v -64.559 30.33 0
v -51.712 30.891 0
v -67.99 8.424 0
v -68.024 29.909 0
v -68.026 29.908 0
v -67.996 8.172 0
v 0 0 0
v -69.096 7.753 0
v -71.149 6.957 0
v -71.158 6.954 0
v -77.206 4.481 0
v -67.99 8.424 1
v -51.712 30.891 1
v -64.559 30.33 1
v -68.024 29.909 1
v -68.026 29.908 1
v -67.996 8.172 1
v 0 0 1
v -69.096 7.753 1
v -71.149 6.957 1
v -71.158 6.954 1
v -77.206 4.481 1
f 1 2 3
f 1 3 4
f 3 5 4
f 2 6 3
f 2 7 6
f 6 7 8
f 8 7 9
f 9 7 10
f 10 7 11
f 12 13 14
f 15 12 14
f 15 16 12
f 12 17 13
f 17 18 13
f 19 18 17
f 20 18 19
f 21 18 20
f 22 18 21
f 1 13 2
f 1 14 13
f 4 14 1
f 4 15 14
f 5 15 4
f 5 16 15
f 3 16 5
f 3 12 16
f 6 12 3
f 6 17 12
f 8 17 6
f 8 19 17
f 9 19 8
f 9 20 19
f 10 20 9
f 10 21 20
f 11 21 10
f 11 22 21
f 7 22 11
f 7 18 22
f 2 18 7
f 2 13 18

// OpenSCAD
// Generated by SolidPython 1.1.3 on 2024-05-19 23:35:49


linear_extrude(height = 1) {
	polygon(points = [[0, 0], [-51.7123125000, 30.8905437500], [-51.8104468750, 30.8862640625], [-51.9085812500, 30.8819843750], [-52.0067156250, 30.8777046875], [-52.1048500000, 30.8734250000], [-52.2029843750, 30.8691453125], [-52.3011187500, 30.8648656250], [-52.3992531250, 30.8605859375], [-52.4973875000, 30.8563062500], [-52.5955218750, 30.8520265625], [-52.6936562500, 30.8477468750], [-52.7917906250, 30.8434671875], [-52.8899250000, 30.8391875000], [-52.9880593750, 30.8349078125], [-53.0861937500, 30.8306281250], [-53.1843281250, 30.8263484375], [-53.2824625000, 30.8220687500], [-53.3805968750, 30.8177890625], [-53.4787312500, 30.8135093750], [-53.5768656250, 30.8092296875], [-53.6750000000, 30.8049500000], [-53.7731343750, 30.8006703125], [-53.8712687500, 30.7963906250], [-53.9694031250, 30.7921109375], [-54.0675375000, 30.7878312500], [-54.1656718750, 30.7835515625], [-54.2638062500, 30.7792718750], [-54.3619406250, 30.7749921875], [-54.4600750000, 30.7707125000], [-54.5582093750, 30.7664328125], [-54.6563437500, 30.7621531250], [-54.7544781250, 30.7578734375], [-54.8526125000, 30.7535937500], [-54.9507468750, 30.7493140625], [-55.0488812500, 30.7450343750], [-55.1470156250, 30.7407546875], [-55.2451500000, 30.7364750000], [-55.3432843750, 30.7321953125], [-55.4414187500, 30.7279156250], [-55.5395531250, 30.7236359375], [-55.6376875000, 30.7193562500], [-55.7358218750, 30.7150765625], [-55.8339562500, 30.7107968750], [-55.9320906250, 30.7065171875], [-56.0302250000, 30.7022375000], [-56.1283593750, 30.6979578125], [-56.2264937500, 30.6936781250], [-56.3246281250, 30.6893984375], [-56.4227625000, 30.6851187500], [-56.5208968750, 30.6808390625], [-56.6190312500, 30.6765593750], [-56.7171656250, 30.6722796875], [-56.8153000000, 30.6680000000], [-56.8757945312, 30.6653617187], [-56.9362890625, 30.6627234375], [-56.9967835937, 30.6600851562], [-57.0572781250, 30.6574468750], [-57.1177726562, 30.6548085937], [-57.1782671875, 30.6521703125], [-57.2387617187, 30.6495320312], [-57.2992562500, 30.6468937500], [-57.3597507812, 30.6442554688], [-57.4202453125, 30.6416171875], [-57.4807398438, 30.6389789063], [-57.5412343750, 30.6363406250], [-57.6017289063, 30.6337023438], [-57.6622234375, 30.6310640625], [-57.7227179688, 30.6284257813], [-57.7832125000, 30.6257875000], [-57.8437070313, 30.6231492188], [-57.9042015625, 30.6205109375], [-57.9646960938, 30.6178726563], [-58.0251906250, 30.6152343750], [-58.0856851563, 30.6125960937], [-58.1461796875, 30.6099578125], [-58.2066742188, 30.6073195312], [-58.2671687500, 30.6046812500], [-58.3276632812, 30.6020429687], [-58.3881578125, 30.5994046875], [-58.4486523437, 30.5967664062], [-58.5091468750, 30.5941281250], [-58.5696414062, 30.5914898437], [-58.6301359375, 30.5888515625], [-58.6906304688, 30.5862132812], [-58.7511250000, 30.5835750000], [-58.8116195313, 30.5809367188], [-58.8721140625, 30.5782984375], [-58.9326085938, 30.5756601563], [-58.9931031250, 30.5730218750], [-59.0535976563, 30.5703835938], [-59.1140921875, 30.5677453125], [-59.1745867188, 30.5651070313], [-59.2350812500, 30.5624687500], [-59.2955757812, 30.5598304688], [-59.3560703125, 30.5571921875], [-59.4165648437, 30.5545539062], [-59.4770593750, 30.5519156250], [-59.5375539062, 30.5492773437], [-59.5980484375, 30.5466390625], [-59.6585429687, 30.5440007812], [-59.7190375000, 30.5413625000], [-59.7795320312, 30.5387242187], [-59.8400265625, 30.5360859375], [-59.9005210938, 30.5334476562], [-59.9610156250, 30.5308093750], [-60.0215101563, 30.5281710937], [-60.0820046875, 30.5255328125], [-60.1424992188, 30.5228945312], [-60.2029937500, 30.5202562500], [-60.2634882812, 30.5176179688], [-60.3239828125, 30.5149796875], [-60.3844773437, 30.5123414063], [-60.4449718750, 30.5097031250], [-60.5054664062, 30.5070648438], [-60.5659609375, 30.5044265625], [-60.6264554687, 30.5017882813], [-60.6869500000, 30.4991500000], [-60.7474445312, 30.4965117187], [-60.8079390625, 30.4938734375], [-60.8684335937, 30.4912351562], [-60.9289281250, 30.4885968750], [-60.9894226562, 30.4859585937], [-61.0499171875, 30.4833203125], [-61.1104117188, 30.4806820312], [-61.1709062500, 30.4780437500], [-61.2314007812, 30.4754054688], [-61.2918953125, 30.4727671875], [-61.3523898437, 30.4701289063], [-61.4128843750, 30.4674906250], [-61.4733789062, 30.4648523438], [-61.5338734375, 30.4622140625], [-61.5943679687, 30.4595757813], [-61.6548625000, 30.4569375000], [-61.7153570312, 30.4542992188], [-61.7758515625, 30.4516609375], [-61.8363460937, 30.4490226563], [-61.8968406250, 30.4463843750], [-61.9573351562, 30.4437460938], [-62.0178296875, 30.4411078125], [-62.0783242187, 30.4384695312], [-62.1388187500, 30.4358312500], [-62.1993132812, 30.4331929687], [-62.2598078125, 30.4305546875], [-62.3203023438, 30.4279164062], [-62.3807968750, 30.4252781250], [-62.4412914063, 30.4226398437], [-62.5017859375, 30.4200015625], [-62.5622804688, 30.4173632812], [-62.6227750000, 30.4147250000], [-62.6832695312, 30.4120867188], [-62.7437640625, 30.4094484375], [-62.8042585937, 30.4068101563], [-62.8647531250, 30.4041718750], [-62.9252476562, 30.4015335938], [-62.9857421875, 30.3988953125], [-63.0462367187, 30.3962570313], [-63.1067312500, 30.3936187500], [-63.1672257812, 30.3909804688], [-63.2277203125, 30.3883421875], [-63.2882148437, 30.3857039063], [-63.3487093750, 30.3830656250], [-63.4092039062, 30.3804273438], [-63.4696984375, 30.3777890625], [-63.5301929688, 30.3751507812], [-63.5906875000, 30.3725125000], [-63.6511820313, 30.3698742187], [-63.7116765625, 30.3672359375], [-63.7721710938, 30.3645976562], [-63.8326656250, 30.3619593750], [-63.8931601563, 30.3593210937], [-63.9536546875, 30.3566828125], [-64.0141492188, 30.3540445312], [-64.0746437500, 30.3514062500], [-64.1351382813, 30.3487679688], [-64.1956328125, 30.3461296875], [-64.2561273438, 30.3434914063], [-64.3166218750, 30.3408531250], [-64.3771164063, 30.3382148438], [-64.4376109375, 30.3355765625], [-64.4981054687, 30.3329382813], [-64.5586000000, 30.3303000000], [-64.6151375000, 30.3234250000], [-64.6716750000, 30.3165500000], [-64.7282125000, 30.3096750000], [-64.7847500000, 30.3028000000], [-64.8412875000, 30.2959250000], [-64.8978250000, 30.2890500000], [-64.9543625000, 30.2821750000], [-65.0109000000, 30.2753000000], [-65.1050468750, 30.2638468750], [-65.1991937500, 30.2523937500], [-65.2933406250, 30.2409406250], [-65.3874875000, 30.2294875000], [-65.4816343750, 30.2180343750], [-65.5757812500, 30.2065812500], [-65.6699281250, 30.1951281250], [-65.7640750000, 30.1836750000], [-65.8582218750, 30.1722218750], [-65.9523687500, 30.1607687500], [-66.0465156250, 30.1493156250], [-66.1406625000, 30.1378625000], [-66.2348093750, 30.1264093750], [-66.3289562500, 30.1149562500], [-66.4231031250, 30.1035031250], [-66.5172500000, 30.0920500000], [-66.6113968750, 30.0805968750], [-66.7055437500, 30.0691437500], [-66.7996906250, 30.0576906250], [-66.8938375000, 30.0462375000], [-66.9879843750, 30.0347843750], [-67.0821312500, 30.0233312500], [-67.1762781250, 30.0118781250], [-67.2704250000, 30.0004250000], [-67.3645718750, 29.9889718750], [-67.4587187500, 29.9775187500], [-67.5528656250, 29.9660656250], [-67.6470125000, 29.9546125000], [-67.7411593750, 29.9431593750], [-67.8353062500, 29.9317062500], [-67.9294531250, 29.9202531250], [-68.0236000000, 29.9088000000], [-68.0256000000, 29.9085000000], [-68.0259000000, 29.9085000000], [-68.0257613281, 29.8245743359], [-68.0256226562, 29.7406486719], [-68.0254839844, 29.6567230078], [-68.0253453125, 29.5727973437], [-68.0252066406, 29.4888716797], [-68.0250679687, 29.4049460156], [-68.0249292969, 29.3210203516], [-68.0247906250, 29.2370946875], [-68.0246519531, 29.1531690234], [-68.0245132812, 29.0692433594], [-68.0243746094, 28.9853176953], [-68.0242359375, 28.9013920312], [-68.0240972656, 28.8174663672], [-68.0239585937, 28.7335407031], [-68.0238199219, 28.6496150391], [-68.0236812500, 28.5656893750], [-68.0235425781, 28.4817637109], [-68.0234039062, 28.3978380469], [-68.0232652344, 28.3139123828], [-68.0231265625, 28.2299867187], [-68.0229878906, 28.1460610547], [-68.0228492187, 28.0621353906], [-68.0227105469, 27.9782097266], [-68.0225718750, 27.8942840625], [-68.0224332031, 27.8103583984], [-68.0222945312, 27.7264327344], [-68.0221558594, 27.6425070703], [-68.0220171875, 27.5585814062], [-68.0218785156, 27.4746557422], [-68.0217398437, 27.3907300781], [-68.0216011719, 27.3068044141], [-68.0214625000, 27.2228787500], [-68.0213238281, 27.1389530859], [-68.0211851562, 27.0550274219], [-68.0210464844, 26.9711017578], [-68.0209078125, 26.8871760937], [-68.0207691406, 26.8032504297], [-68.0206304687, 26.7193247656], [-68.0204917969, 26.6353991016], [-68.0203531250, 26.5514734375], [-68.0202144531, 26.4675477734], [-68.0200757812, 26.3836221094], [-68.0199371094, 26.2996964453], [-68.0197984375, 26.2157707813], [-68.0196597656, 26.1318451172], [-68.0195210937, 26.0479194531], [-68.0193824219, 25.9639937891], [-68.0192437500, 25.8800681250], [-68.0191050781, 25.7961424609], [-68.0189664062, 25.7122167969], [-68.0188277344, 25.6282911328], [-68.0186890625, 25.5443654688], [-68.0185503906, 25.4604398047], [-68.0184117187, 25.3765141406], [-68.0182730469, 25.2925884766], [-68.0181343750, 25.2086628125], [-68.0179957031, 25.1247371484], [-68.0178570312, 25.0408114844], [-68.0177183594, 24.9568858203], [-68.0175796875, 24.8729601563], [-68.0174410156, 24.7890344922], [-68.0173023437, 24.7051088281], [-68.0171636719, 24.6211831641], [-68.0170250000, 24.5372575000], [-68.0168863281, 24.4533318359], [-68.0167476562, 24.3694061719], [-68.0166089844, 24.2854805078], [-68.0164703125, 24.2015548438], [-68.0163316406, 24.1176291797], [-68.0161929687, 24.0337035156], [-68.0160542969, 23.9497778516], [-68.0159156250, 23.8658521875], [-68.0157769531, 23.7819265234], [-68.0156382812, 23.6980008594], [-68.0154996094, 23.6140751953], [-68.0153609375, 23.5301495313], [-68.0152222656, 23.4462238672], [-68.0150835937, 23.3622982031], [-68.0149449219, 23.2783725391], [-68.0148062500, 23.1944468750], [-68.0146675781, 23.1105212109], [-68.0145289062, 23.0265955469], [-68.0143902344, 22.9426698828], [-68.0142515625, 22.8587442188], [-68.0141128906, 22.7748185547], [-68.0139742187, 22.6908928906], [-68.0138355469, 22.6069672266], [-68.0136968750, 22.5230415625], [-68.0135582031, 22.4391158984], [-68.0134195312, 22.3551902344], [-68.0132808594, 22.2712645703], [-68.0131421875, 22.1873389063], [-68.0130035156, 22.1034132422], [-68.0128648437, 22.0194875781], [-68.0127261719, 21.9355619141], [-68.0125875000, 21.8516362500], [-68.0124488281, 21.7677105859], [-68.0123101562, 21.6837849219], [-68.0121714844, 21.5998592578], [-68.0120328125, 21.5159335937], [-68.0118941406, 21.4320079297], [-68.0117554687, 21.3480822656], [-68.0116167969, 21.2641566016], [-68.0114781250, 21.1802309375], [-68.0113394531, 21.0963052734], [-68.0112007812, 21.0123796094], [-68.0110621094, 20.9284539453], [-68.0109234375, 20.8445282812], [-68.0107847656, 20.7606026172], [-68.0106460937, 20.6766769531], [-68.0105074219, 20.5927512891], [-68.0103687500, 20.5088256250], [-68.0102300781, 20.4248999609], [-68.0100914062, 20.3409742969], [-68.0099527344, 20.2570486328], [-68.0098140625, 20.1731229688], [-68.0096753906, 20.0891973047], [-68.0095367187, 20.0052716406], [-68.0093980469, 19.9213459766], [-68.0092593750, 19.8374203125], [-68.0091207031, 19.7534946484], [-68.0089820312, 19.6695689844], [-68.0088433594, 19.5856433203], [-68.0087046875, 19.5017176563], [-68.0085660156, 19.4177919922], [-68.0084273438, 19.3338663281], [-68.0082886719, 19.2499406641], [-68.0081500000, 19.1660150000], [-68.0080113281, 19.0820893359], [-68.0078726563, 18.9981636719], [-68.0077339844, 18.9142380078], [-68.0075953125, 18.8303123438], [-68.0074566406, 18.7463866797], [-68.0073179688, 18.6624610156], [-68.0071792969, 18.5785353516], [-68.0070406250, 18.4946096875], [-68.0069019531, 18.4106840234], [-68.0067632813, 18.3267583594], [-68.0066246094, 18.2428326953], [-68.0064859375, 18.1589070313], [-68.0063472656, 18.0749813672], [-68.0062085938, 17.9910557031], [-68.0060699219, 17.9071300391], [-68.0059312500, 17.8232043750], [-68.0057925781, 17.7392787109], [-68.0056539063, 17.6553530469], [-68.0055152344, 17.5714273828], [-68.0053765625, 17.4875017188], [-68.0052378906, 17.4035760547], [-68.0050992188, 17.3196503906], [-68.0049605469, 17.2357247266], [-68.0048218750, 17.1517990625], [-68.0046832031, 17.0678733984], [-68.0045445313, 16.9839477344], [-68.0044058594, 16.9000220703], [-68.0042671875, 16.8160964063], [-68.0041285156, 16.7321707422], [-68.0039898438, 16.6482450781], [-68.0038511719, 16.5643194141], [-68.0037125000, 16.4803937500], [-68.0035738281, 16.3964680859], [-68.0034351563, 16.3125424219], [-68.0032964844, 16.2286167578], [-68.0031578125, 16.1446910938], [-68.0030191406, 16.0607654297], [-68.0028804688, 15.9768397656], [-68.0027417969, 15.8929141016], [-68.0026031250, 15.8089884375], [-68.0024644531, 15.7250627734], [-68.0023257813, 15.6411371094], [-68.0021871094, 15.5572114453], [-68.0020484375, 15.4732857813], [-68.0019097656, 15.3893601172], [-68.0017710938, 15.3054344531], [-68.0016324219, 15.2215087891], [-68.0014937500, 15.1375831250], [-68.0013550781, 15.0536574609], [-68.0012164063, 14.9697317969], [-68.0010777344, 14.8858061328], [-68.0009390625, 14.8018804687], [-68.0008003906, 14.7179548047], [-68.0006617188, 14.6340291406], [-68.0005230469, 14.5501034766], [-68.0003843750, 14.4661778125], [-68.0002457031, 14.3822521484], [-68.0001070313, 14.2983264844], [-67.9999683594, 14.2144008203], [-67.9998296875, 14.1304751563], [-67.9996910156, 14.0465494922], [-67.9995523437, 13.9626238281], [-67.9994136719, 13.8786981641], [-67.9992750000, 13.7947725000], [-67.9991363281, 13.7108468359], [-67.9989976562, 13.6269211719], [-67.9988589844, 13.5429955078], [-67.9987203125, 13.4590698438], [-67.9985816406, 13.3751441797], [-67.9984429687, 13.2912185156], [-67.9983042969, 13.2072928516], [-67.9981656250, 13.1233671875], [-67.9980269531, 13.0394415234], [-67.9978882812, 12.9555158594], [-67.9977496094, 12.8715901953], [-67.9976109375, 12.7876645313], [-67.9974722656, 12.7037388672], [-67.9973335937, 12.6198132031], [-67.9971949219, 12.5358875391], [-67.9970562500, 12.4519618750], [-67.9969175781, 12.3680362109], [-67.9967789062, 12.2841105469], [-67.9966402344, 12.2001848828], [-67.9965015625, 12.1162592187], [-67.9963628906, 12.0323335547], [-67.9962242187, 11.9484078906], [-67.9960855469, 11.8644822266], [-67.9959468750, 11.7805565625], [-67.9958082031, 11.6966308984], [-67.9956695312, 11.6127052344], [-67.9955308594, 11.5287795703], [-67.9953921875, 11.4448539062], [-67.9952535156, 11.3609282422], [-67.9951148437, 11.2770025781], [-67.9949761719, 11.1930769141], [-67.9948375000, 11.1091512500], [-67.9946988281, 11.0252255859], [-67.9945601562, 10.9412999219], [-67.9944214844, 10.8573742578], [-67.9942828125, 10.7734485938], [-67.9941441406, 10.6895229297], [-67.9940054687, 10.6055972656], [-67.9938667969, 10.5216716016], [-67.9937281250, 10.4377459375], [-67.9935894531, 10.3538202734], [-67.9934507812, 10.2698946094], [-67.9933121094, 10.1859689453], [-67.9931734375, 10.1020432813], [-67.9930347656, 10.0181176172], [-67.9928960937, 9.9341919531], [-67.9927574219, 9.8502662891], [-67.9926187500, 9.7663406250], [-67.9924800781, 9.6824149609], [-67.9923414062, 9.5984892969], [-67.9922027344, 9.5145636328], [-67.9920640625, 9.4306379687], [-67.9919253906, 9.3467123047], [-67.9917867187, 9.2627866406], [-67.9916480469, 9.1788609766], [-67.9915093750, 9.0949353125], [-67.9913707031, 9.0110096484], [-67.9912320312, 8.9270839844], [-67.9910933594, 8.8431583203], [-67.9909546875, 8.7592326562], [-67.9908160156, 8.6753069922], [-67.9906773437, 8.5913813281], [-67.9905386719, 8.5074556641], [-67.9904000000, 8.4235300000], [-67.9917500000, 8.3607075000], [-67.9931000000, 8.2978850000], [-67.9944500000, 8.2350625000], [-67.9958000000, 8.1722400000], [-68.0645375000, 8.1460543750], [-68.1332750000, 8.1198687500], [-68.2020125000, 8.0936831250], [-68.2707500000, 8.0674975000], [-68.3394875000, 8.0413118750], [-68.4082250000, 8.0151262500], [-68.4769625000, 7.9889406250], [-68.5457000000, 7.9627550000], [-68.6144375000, 7.9365693750], [-68.6831750000, 7.9103837500], [-68.7519125000, 7.8841981250], [-68.8206500000, 7.8580125000], [-68.8893875000, 7.8318268750], [-68.9581250000, 7.8056412500], [-69.0268625000, 7.7794556250], [-69.0956000000, 7.7532700000], [-69.1597625000, 7.7283896875], [-69.2239250000, 7.7035093750], [-69.2880875000, 7.6786290625], [-69.3522500000, 7.6537487500], [-69.4164125000, 7.6288684375], [-69.4805750000, 7.6039881250], [-69.5447375000, 7.5791078125], [-69.6089000000, 7.5542275000], [-69.6730625000, 7.5293471875], [-69.7372250000, 7.5044668750], [-69.8013875000, 7.4795865625], [-69.8655500000, 7.4547062500], [-69.9297125000, 7.4298259375], [-69.9938750000, 7.4049456250], [-70.0580375000, 7.3800653125], [-70.1222000000, 7.3551850000], [-70.1863625000, 7.3303046875], [-70.2505250000, 7.3054243750], [-70.3146875000, 7.2805440625], [-70.3788500000, 7.2556637500], [-70.4430125000, 7.2307834375], [-70.5071750000, 7.2059031250], [-70.5713375000, 7.1810228125], [-70.6355000000, 7.1561425000], [-70.6996625000, 7.1312621875], [-70.7638250000, 7.1063818750], [-70.8279875000, 7.0815015625], [-70.8921500000, 7.0566212500], [-70.9563125000, 7.0317409375], [-71.0204750000, 7.0068606250], [-71.0846375000, 6.9819803125], [-71.1488000000, 6.9571000000], [-71.1576000000, 6.9536100000], [-71.2146585938, 6.9302816406], [-71.2717171875, 6.9069532813], [-71.3287757813, 6.8836249219], [-71.3858343750, 6.8602965625], [-71.4428929688, 6.8369682031], [-71.4999515625, 6.8136398437], [-71.5570101563, 6.7903114844], [-71.6140687500, 6.7669831250], [-71.6711273438, 6.7436547656], [-71.7281859375, 6.7203264062], [-71.7852445313, 6.6969980469], [-71.8423031250, 6.6736696875], [-71.8993617188, 6.6503413281], [-71.9564203125, 6.6270129687], [-72.0134789063, 6.6036846094], [-72.0705375000, 6.5803562500], [-72.1275960938, 6.5570278906], [-72.1846546875, 6.5336995312], [-72.2417132813, 6.5103711719], [-72.2987718750, 6.4870428125], [-72.3558304687, 6.4637144531], [-72.4128890625, 6.4403860937], [-72.4699476562, 6.4170577344], [-72.5270062500, 6.3937293750], [-72.5840648437, 6.3704010156], [-72.6411234375, 6.3470726562], [-72.6981820312, 6.3237442969], [-72.7552406250, 6.3004159375], [-72.8122992187, 6.2770875781], [-72.8693578125, 6.2537592187], [-72.9264164062, 6.2304308594], [-72.9834750000, 6.2071025000], [-73.0405335937, 6.1837741406], [-73.0975921875, 6.1604457812], [-73.1546507812, 6.1371174219], [-73.2117093750, 6.1137890625], [-73.2687679687, 6.0904607031], [-73.3258265625, 6.0671323437], [-73.3828851562, 6.0438039844], [-73.4399437500, 6.0204756250], [-73.4970023437, 5.9971472656], [-73.5540609375, 5.9738189062], [-73.6111195312, 5.9504905469], [-73.6681781250, 5.9271621875], [-73.7252367187, 5.9038338281], [-73.7822953125, 5.8805054688], [-73.8393539062, 5.8571771094], [-73.8964125000, 5.8338487500], [-73.9534710937, 5.8105203906], [-74.0105296875, 5.7871920312], [-74.0675882812, 5.7638636719], [-74.1246468750, 5.7405353125], [-74.1817054687, 5.7172069531], [-74.2387640625, 5.6938785938], [-74.2958226562, 5.6705502344], [-74.3528812500, 5.6472218750], [-74.4099398437, 5.6238935156], [-74.4669984375, 5.6005651562], [-74.5240570312, 5.5772367969], [-74.5811156250, 5.5539084375], [-74.6381742187, 5.5305800781], [-74.6952328125, 5.5072517188], [-74.7522914062, 5.4839233594], [-74.8093500000, 5.4605950000], [-74.8664085937, 5.4372666406], [-74.9234671875, 5.4139382812], [-74.9805257812, 5.3906099219], [-75.0375843750, 5.3672815625], [-75.0946429687, 5.3439532031], [-75.1517015625, 5.3206248438], [-75.2087601562, 5.2972964844], [-75.2658187500, 5.2739681250], [-75.3228773437, 5.2506397656], [-75.3799359375, 5.2273114062], [-75.4369945312, 5.2039830469], [-75.4940531250, 5.1806546875], [-75.5511117187, 5.1573263281], [-75.6081703125, 5.1339979688], [-75.6652289062, 5.1106696094], [-75.7222875000, 5.0873412500], [-75.7793460937, 5.0640128906], [-75.8364046875, 5.0406845312], [-75.8934632812, 5.0173561719], [-75.9505218750, 4.9940278125], [-76.0075804687, 4.9706994531], [-76.0646390625, 4.9473710938], [-76.1216976562, 4.9240427344], [-76.1787562500, 4.9007143750], [-76.2358148437, 4.8773860156], [-76.2928734375, 4.8540576562], [-76.3499320312, 4.8307292969], [-76.4069906250, 4.8074009375], [-76.4640492187, 4.7840725781], [-76.5211078125, 4.7607442188], [-76.5781664062, 4.7374158594], [-76.6352250000, 4.7140875000], [-76.6922835937, 4.6907591406], [-76.7493421875, 4.6674307812], [-76.8064007812, 4.6441024219], [-76.8634593750, 4.6207740625], [-76.9205179687, 4.5974457031], [-76.9775765625, 4.5741173438], [-77.0346351562, 4.5507889844], [-77.0916937500, 4.5274606250], [-77.1487523437, 4.5041322656], [-77.2058109375, 4.4808039062]]);
}
/***********************************************
*********      SolidPython code:      **********
************************************************
 
import math
import time

from stl import mesh, Dimension

from tkinter import Tk     # from tkinter import Tk for Python 3.x
from tkinter.filedialog import askopenfilename
from mpl_toolkits.mplot3d import art3d
from matplotlib import pyplot as plt
import solid
import os
import ezdxf
import shapely.geometry as sg
import subprocess
from GUI import getSCADPath



def outputSTL(From, To, PATH=getSCADPath()):
    subprocess.Popen(PATH + " -o " + To + " " + From)
    while not os.path.exists(To):
        time.sleep(1)


def get_size(i):
    x_list = [int(a) for a in str(i)]
    return len(x_list)



class Model:
    def __init__(self, model, fileName, location, layer, thickness):
        self.location = location
        self.code = None
        self.fileName = fileName
        self.stl = fileName + ".stl"
        self.layer = layer
        self.thickness = thickness
        self.maxz = (layer+1)*thickness
        self.dxf = fileName + ".dxf"
        self.scad = fileName + ".scad"
        self.model = model
        self.center = None
        self.width = 10
        self.mesh = None
        self.useable_area = None


    def get_code(self):
        max_dim = 0.05
        max_array = 6

        num = int(self.fileName)
        nums = [int(a) for a in str(num)]
        nums.reverse()
        indices = nums
        length = len(nums)

        print(indices)
        t = 0
        i = 0
        cubes = []
        x = 0
        y = 0
        width = 0.01
        while x <= max_dim:
            while y <= max_dim:
                print(indices)
                if nums == []:
                    break
                if indices[0] != 0:
                    cubes.append(solid.translate([x, y, 0])(solid.cube(size=t / 1000 + 0.001)))
                    y += max_dim / (max_array - 1)
                    nums[0] = nums[0] - 1
                else:
                    indices.pop(0)
                    t += 1
                i += 1
            x += max_dim / (max_array - 1)
            y = 0

        outside = solid.translate([-width / 2, -width / 2])(solid.cube(max_dim + (length - 1) / 1000 + 0.001 + width))
        self.code = solid.difference()(outside, cubes)
        self.code = solid.projection(cut=True)(self.code)
        solid.scad_render_to_file(self.code, self.location + "/code.scad")
        outputSTL(From=self.location+"/code.scad", To=self.location+"code.dxf", PATH=getSCADPath())
        # os.system("toSTL.sh renders/code.scad renders/code.dxf")
        return self.location+"/code.dxf"

    def download(self, type):
        if type =="stl":
            print("generating:" + self.location+"/"+ self.fileName+".stl")
            outputSTL(From=self.location+"/"+self.fileName+".scad", To=self.location+"/"+self.fileName+".stl")
            # os.system("toSTL.sh renders/"+ self.fileName+".scad renders/"+ self.fileName+".stl")
        elif type == "dxf":
            outputSTL(From=self.location+"/"+self.fileName+".scad", To=self.location+"/"+self.fileName+".dxf")
            # os.system("toSTL.sh renders/"+ self.fileName+".scad renders/"+ self.fileName+".dxf")

    def render(self):
        solid.scad_render_to_file(self.model, self.location+"/"+ self.fileName+'.scad')
        while not os.path.exists(self.location+"/"+self.fileName+".scad"):
            time.sleep(1)

    def get_points(self):
        doc = ezdxf.readfile(filename=self.location+"/"+ self.fileName+".dxf")
        msp = doc.modelspace()
        i=0
        lists = []
        def helper(e):
            start = [e.dxf.start[0], e.dxf.start[1]]
            end = [e.dxf.end[0], e.dxf.end[1]]
            return [start, end]

        for e in msp.query("LINE"):
            line = helper(e)
            if not lists:
                lists.append([line])
            else:
                if lists[i][len(lists)-1][1] != line[0]:
                    lists.append([line])
                    i+=1
                else:
                    lists[i].append(line)

    def get_points2(self, FILE):
        doc = ezdxf.readfile(filename=FILE)
        msp = doc.modelspace()
        i = 0
        lists = []

        def helper(e):
            start = [e.dxf.start[0], e.dxf.start[1]]
            end = [e.dxf.end[0], e.dxf.end[1]]
            return (start, end)

        for e in msp.query("LINE"):
            line = helper(e)
            if lists==[]:
                lists.append([line])
            else:
                if lists[i][len(lists[i]) - 1][1] != line[0]:
                    lists.append([line])
                    i += 1
                else:
                    lists[i].append(line)
        return lists

    def add_code(self):
        dxf = solid.projection(cut=False)(self.model)
        offset = solid.offset(r=-0.1)(dxf)
        solid.scad_render_to_file(offset, self.location+'/offset.scad')
        os.system("toSTL.sh renders/offset.scad renders/offset.dxf")
        lines = self.get_points2("renders/offset.dxf")
        x = lines[0][0][0][0]
        y = lines[0][0][0][1]
        print(x)
        print(y)
        code = solid.translate([x,y,0])(self.code)
        code = solid.linear_extrude(height=999)(code)
        save = self.model
        self.model = solid.projection()(solid.difference()(self.model, code))
        self.render()
        self.download("dxf")
        self.model = save

    def add_label(self, pos):
        # num = 12
        # minx, maxx, miny, maxy, minz, maxz = self.find_minmax()
        maxz = self.maxz
        # label = solid.linear_extrude(height=(maxz-minz)/3)(solid.text(str(self.fileName), size=0.5, halign="center"))
        # i=minx
        # print("x-len: " + str(maxx-minx))
        # print(i)
        # inc = (maxx-minx)/num
        # while minx <= i <= maxx:
        #     label = solid.union()(solid.translate([i, 0, maxz - 0.2])(solid.linear_extrude(height=(maxz-minz)/3)(solid.text(str(self.fileName), size=0.25, halign="center"))), label)
        #     i += inc
        #
        # l = label
        #
        # i =miny
        # while miny<= i <= maxy:
        #     print("y inc")
        #     l = solid.union()(solid.translate([0, i, 0])(label), l)
        #     i += 0.5
        for i in str(self.fileName):
            cur = pos[0]
            label = solid.translate([pos[0][0], pos[0][1], self.maxz-0.2])(solid.linear_extrude(height=(self.thickness)/3)(solid.text(str(i), size=0.5, halign="center", valign="center")))
            self.model = solid.difference()(self.model, label)
            pos.append(pos.pop(0))
            while abs(cur[0]-pos[0][0])<0.5 and abs(cur[1]-pos[0][1])<0.5:
                pos.append(pos.pop(0))



    def Center(self):

        volume, cog, inertia = self.mesh.get_mass_properties()
        print("Volume                                  = {0}".format(volume))
        print("Position of the center of gravity (COG) = {0}".format(cog))
        m_centered = solid.translate([-cog[0], -cog[1], 0])(
            self.model
        )
        return m_centered

    def find_minmax(self):
        minx = maxx = miny = maxy = minz = maxz = None
        for p in self.mesh.points:
            # p contains (x, y, z)
            if minx is None:
                minx = p[Dimension.X]
                maxx = p[Dimension.X]
                miny = p[Dimension.Y]
                maxy = p[Dimension.Y]
                minz = p[Dimension.Z]
                maxz = p[Dimension.Z]
            else:
                maxx = max(p[Dimension.X], maxx)
                minx = min(p[Dimension.X], minx)
                maxy = max(p[Dimension.Y], maxy)
                miny = min(p[Dimension.Y], miny)
                maxz = max(p[Dimension.Z], maxz)
                minz = min(p[Dimension.Z], minz)
        lenx = maxx - minx
        leny = maxy - miny
        lenz = maxz - minz
        return minx, maxx, miny, maxy, minz, maxz

    # def generate_Mesh(self):
    #     self.mesh = mesh.Mesh.from_file(self.location + "/" + str(int(self.fileName)//8)+ "b.stl")

    def get_top(self):
        top = solid.projection(cut=True)(solid.translate([0,0,-1*self.thickness*(self.layer+1)])(self.model))
        useable_area = solid.offset(r=-0.45)(top)
        self.useable_area = useable_area
        solid.scad_render_to_file(self.useable_area, self.location+'/' + 'toptemp.scad')
        outputSTL(From=self.location+'/' + 'toptemp.scad', To=self.location+"/top"+ self.dxf)

        # os.system("toSTL.sh out/toptemp.scad renders/" + self.fileName + ".dxf")
        dxf = DXF(self.location+"/top"+ self.dxf)
        min_p=dxf.points[0][0]
        points_ordered = dxf.points
        i=0
        while i <= len(dxf.points)+1:
            while math.sqrt((dxf.points[0][0]-dxf.points[1][0])**2+(dxf.points[0][1]-dxf.points[1][1])**2) > 0.1:
                dxf.points.insert(1, [(dxf.points[0][0]+dxf.points[1][0])/2, (dxf.points[0][1]+dxf.points[1][1])/2])
                i = i-1
            dxf.points.append(dxf.points.pop(0))
            i+=1
        for i in range(len(dxf.points)):
            dxf.points.append(dxf.points.pop(0))
            if dxf.points[0][0] < min_p:
                min_p = dxf.points[0][0]
                points_ordered = dxf.points.copy()
        dxf.points = points_ordered.copy()

        print(dxf.points)
        self.add_label(dxf.points)

class DXF:
    def __init__(self, file):
        self.file = file
        self.Lines = []
        self.points = []
        doc = ezdxf.readfile(self.file)
        msp = doc.modelspace()
        for e in msp:
            if e.dxftype() == "LINE":
                self.Lines.append(e)
                self.points.append([e.dxf.start[0], e.dxf.start[1]])
        # self.points.append([self.Lines[-1].dxf.end[0], self.Lines[-1].dxf.end[1]])
        self.area = None
        self.center = None
        self.polygon = sg.Polygon(self.points)

    def get_area(self):
        self.area = self.polygon.area
        return self.area

    def get_center(self):
        x_sum = 0
        y_sum =0
        for i in self.points:
            x_sum += i[0]
            y_sum += i[1]
        x_c = x_sum/len(self.points)
        y_c = y_sum/len(self.points)
        return (x_c, y_c)

    def split(self, maxdim):
        splits = []
        length = 0
        pieces = [[]]
        prev = self.points[0]
        for j in self.points:
            length = length + math.sqrt((prev[0]-j[0])**2+(prev[1]-j[1])**2)
            if length >= maxdim:
                pieces[-1].append(j)
                pieces.append([])
                length = 0
            pieces[-1].append(j)
            prev = j
        for j in pieces:
            j.insert(0, [0,0])
            piece = solid.linear_extrude(height=1)(solid.polygon(j))
            splits.append(piece)
        return splits
    def refine_points(self):
        i=0
        while i <= len(self.points)+1:
            while math.sqrt((self.points[0][0]-self.points[1][0])**2+(self.points[0][1]-self.points[1][1])**2) > 0.1:
                self.points.insert(1, [(self.points[0][0]+self.points[1][0])/2, (self.points[0][1]+self.points[1][1])/2])
                i = i-1
            self.points.append(self.points.pop(0))
            i+=1


if __name__== "__main__":
    test = DXF("C:/Users/Daniel/Documents/repos/Shell_Maker/output/0top_slice.dxf")
    test.refine_points()
    k = test.split(48)
    for i in range(len(k)):
        solid.scad_render_to_file(k[i], str(i) + ".scad")


 
 
************************************************/
